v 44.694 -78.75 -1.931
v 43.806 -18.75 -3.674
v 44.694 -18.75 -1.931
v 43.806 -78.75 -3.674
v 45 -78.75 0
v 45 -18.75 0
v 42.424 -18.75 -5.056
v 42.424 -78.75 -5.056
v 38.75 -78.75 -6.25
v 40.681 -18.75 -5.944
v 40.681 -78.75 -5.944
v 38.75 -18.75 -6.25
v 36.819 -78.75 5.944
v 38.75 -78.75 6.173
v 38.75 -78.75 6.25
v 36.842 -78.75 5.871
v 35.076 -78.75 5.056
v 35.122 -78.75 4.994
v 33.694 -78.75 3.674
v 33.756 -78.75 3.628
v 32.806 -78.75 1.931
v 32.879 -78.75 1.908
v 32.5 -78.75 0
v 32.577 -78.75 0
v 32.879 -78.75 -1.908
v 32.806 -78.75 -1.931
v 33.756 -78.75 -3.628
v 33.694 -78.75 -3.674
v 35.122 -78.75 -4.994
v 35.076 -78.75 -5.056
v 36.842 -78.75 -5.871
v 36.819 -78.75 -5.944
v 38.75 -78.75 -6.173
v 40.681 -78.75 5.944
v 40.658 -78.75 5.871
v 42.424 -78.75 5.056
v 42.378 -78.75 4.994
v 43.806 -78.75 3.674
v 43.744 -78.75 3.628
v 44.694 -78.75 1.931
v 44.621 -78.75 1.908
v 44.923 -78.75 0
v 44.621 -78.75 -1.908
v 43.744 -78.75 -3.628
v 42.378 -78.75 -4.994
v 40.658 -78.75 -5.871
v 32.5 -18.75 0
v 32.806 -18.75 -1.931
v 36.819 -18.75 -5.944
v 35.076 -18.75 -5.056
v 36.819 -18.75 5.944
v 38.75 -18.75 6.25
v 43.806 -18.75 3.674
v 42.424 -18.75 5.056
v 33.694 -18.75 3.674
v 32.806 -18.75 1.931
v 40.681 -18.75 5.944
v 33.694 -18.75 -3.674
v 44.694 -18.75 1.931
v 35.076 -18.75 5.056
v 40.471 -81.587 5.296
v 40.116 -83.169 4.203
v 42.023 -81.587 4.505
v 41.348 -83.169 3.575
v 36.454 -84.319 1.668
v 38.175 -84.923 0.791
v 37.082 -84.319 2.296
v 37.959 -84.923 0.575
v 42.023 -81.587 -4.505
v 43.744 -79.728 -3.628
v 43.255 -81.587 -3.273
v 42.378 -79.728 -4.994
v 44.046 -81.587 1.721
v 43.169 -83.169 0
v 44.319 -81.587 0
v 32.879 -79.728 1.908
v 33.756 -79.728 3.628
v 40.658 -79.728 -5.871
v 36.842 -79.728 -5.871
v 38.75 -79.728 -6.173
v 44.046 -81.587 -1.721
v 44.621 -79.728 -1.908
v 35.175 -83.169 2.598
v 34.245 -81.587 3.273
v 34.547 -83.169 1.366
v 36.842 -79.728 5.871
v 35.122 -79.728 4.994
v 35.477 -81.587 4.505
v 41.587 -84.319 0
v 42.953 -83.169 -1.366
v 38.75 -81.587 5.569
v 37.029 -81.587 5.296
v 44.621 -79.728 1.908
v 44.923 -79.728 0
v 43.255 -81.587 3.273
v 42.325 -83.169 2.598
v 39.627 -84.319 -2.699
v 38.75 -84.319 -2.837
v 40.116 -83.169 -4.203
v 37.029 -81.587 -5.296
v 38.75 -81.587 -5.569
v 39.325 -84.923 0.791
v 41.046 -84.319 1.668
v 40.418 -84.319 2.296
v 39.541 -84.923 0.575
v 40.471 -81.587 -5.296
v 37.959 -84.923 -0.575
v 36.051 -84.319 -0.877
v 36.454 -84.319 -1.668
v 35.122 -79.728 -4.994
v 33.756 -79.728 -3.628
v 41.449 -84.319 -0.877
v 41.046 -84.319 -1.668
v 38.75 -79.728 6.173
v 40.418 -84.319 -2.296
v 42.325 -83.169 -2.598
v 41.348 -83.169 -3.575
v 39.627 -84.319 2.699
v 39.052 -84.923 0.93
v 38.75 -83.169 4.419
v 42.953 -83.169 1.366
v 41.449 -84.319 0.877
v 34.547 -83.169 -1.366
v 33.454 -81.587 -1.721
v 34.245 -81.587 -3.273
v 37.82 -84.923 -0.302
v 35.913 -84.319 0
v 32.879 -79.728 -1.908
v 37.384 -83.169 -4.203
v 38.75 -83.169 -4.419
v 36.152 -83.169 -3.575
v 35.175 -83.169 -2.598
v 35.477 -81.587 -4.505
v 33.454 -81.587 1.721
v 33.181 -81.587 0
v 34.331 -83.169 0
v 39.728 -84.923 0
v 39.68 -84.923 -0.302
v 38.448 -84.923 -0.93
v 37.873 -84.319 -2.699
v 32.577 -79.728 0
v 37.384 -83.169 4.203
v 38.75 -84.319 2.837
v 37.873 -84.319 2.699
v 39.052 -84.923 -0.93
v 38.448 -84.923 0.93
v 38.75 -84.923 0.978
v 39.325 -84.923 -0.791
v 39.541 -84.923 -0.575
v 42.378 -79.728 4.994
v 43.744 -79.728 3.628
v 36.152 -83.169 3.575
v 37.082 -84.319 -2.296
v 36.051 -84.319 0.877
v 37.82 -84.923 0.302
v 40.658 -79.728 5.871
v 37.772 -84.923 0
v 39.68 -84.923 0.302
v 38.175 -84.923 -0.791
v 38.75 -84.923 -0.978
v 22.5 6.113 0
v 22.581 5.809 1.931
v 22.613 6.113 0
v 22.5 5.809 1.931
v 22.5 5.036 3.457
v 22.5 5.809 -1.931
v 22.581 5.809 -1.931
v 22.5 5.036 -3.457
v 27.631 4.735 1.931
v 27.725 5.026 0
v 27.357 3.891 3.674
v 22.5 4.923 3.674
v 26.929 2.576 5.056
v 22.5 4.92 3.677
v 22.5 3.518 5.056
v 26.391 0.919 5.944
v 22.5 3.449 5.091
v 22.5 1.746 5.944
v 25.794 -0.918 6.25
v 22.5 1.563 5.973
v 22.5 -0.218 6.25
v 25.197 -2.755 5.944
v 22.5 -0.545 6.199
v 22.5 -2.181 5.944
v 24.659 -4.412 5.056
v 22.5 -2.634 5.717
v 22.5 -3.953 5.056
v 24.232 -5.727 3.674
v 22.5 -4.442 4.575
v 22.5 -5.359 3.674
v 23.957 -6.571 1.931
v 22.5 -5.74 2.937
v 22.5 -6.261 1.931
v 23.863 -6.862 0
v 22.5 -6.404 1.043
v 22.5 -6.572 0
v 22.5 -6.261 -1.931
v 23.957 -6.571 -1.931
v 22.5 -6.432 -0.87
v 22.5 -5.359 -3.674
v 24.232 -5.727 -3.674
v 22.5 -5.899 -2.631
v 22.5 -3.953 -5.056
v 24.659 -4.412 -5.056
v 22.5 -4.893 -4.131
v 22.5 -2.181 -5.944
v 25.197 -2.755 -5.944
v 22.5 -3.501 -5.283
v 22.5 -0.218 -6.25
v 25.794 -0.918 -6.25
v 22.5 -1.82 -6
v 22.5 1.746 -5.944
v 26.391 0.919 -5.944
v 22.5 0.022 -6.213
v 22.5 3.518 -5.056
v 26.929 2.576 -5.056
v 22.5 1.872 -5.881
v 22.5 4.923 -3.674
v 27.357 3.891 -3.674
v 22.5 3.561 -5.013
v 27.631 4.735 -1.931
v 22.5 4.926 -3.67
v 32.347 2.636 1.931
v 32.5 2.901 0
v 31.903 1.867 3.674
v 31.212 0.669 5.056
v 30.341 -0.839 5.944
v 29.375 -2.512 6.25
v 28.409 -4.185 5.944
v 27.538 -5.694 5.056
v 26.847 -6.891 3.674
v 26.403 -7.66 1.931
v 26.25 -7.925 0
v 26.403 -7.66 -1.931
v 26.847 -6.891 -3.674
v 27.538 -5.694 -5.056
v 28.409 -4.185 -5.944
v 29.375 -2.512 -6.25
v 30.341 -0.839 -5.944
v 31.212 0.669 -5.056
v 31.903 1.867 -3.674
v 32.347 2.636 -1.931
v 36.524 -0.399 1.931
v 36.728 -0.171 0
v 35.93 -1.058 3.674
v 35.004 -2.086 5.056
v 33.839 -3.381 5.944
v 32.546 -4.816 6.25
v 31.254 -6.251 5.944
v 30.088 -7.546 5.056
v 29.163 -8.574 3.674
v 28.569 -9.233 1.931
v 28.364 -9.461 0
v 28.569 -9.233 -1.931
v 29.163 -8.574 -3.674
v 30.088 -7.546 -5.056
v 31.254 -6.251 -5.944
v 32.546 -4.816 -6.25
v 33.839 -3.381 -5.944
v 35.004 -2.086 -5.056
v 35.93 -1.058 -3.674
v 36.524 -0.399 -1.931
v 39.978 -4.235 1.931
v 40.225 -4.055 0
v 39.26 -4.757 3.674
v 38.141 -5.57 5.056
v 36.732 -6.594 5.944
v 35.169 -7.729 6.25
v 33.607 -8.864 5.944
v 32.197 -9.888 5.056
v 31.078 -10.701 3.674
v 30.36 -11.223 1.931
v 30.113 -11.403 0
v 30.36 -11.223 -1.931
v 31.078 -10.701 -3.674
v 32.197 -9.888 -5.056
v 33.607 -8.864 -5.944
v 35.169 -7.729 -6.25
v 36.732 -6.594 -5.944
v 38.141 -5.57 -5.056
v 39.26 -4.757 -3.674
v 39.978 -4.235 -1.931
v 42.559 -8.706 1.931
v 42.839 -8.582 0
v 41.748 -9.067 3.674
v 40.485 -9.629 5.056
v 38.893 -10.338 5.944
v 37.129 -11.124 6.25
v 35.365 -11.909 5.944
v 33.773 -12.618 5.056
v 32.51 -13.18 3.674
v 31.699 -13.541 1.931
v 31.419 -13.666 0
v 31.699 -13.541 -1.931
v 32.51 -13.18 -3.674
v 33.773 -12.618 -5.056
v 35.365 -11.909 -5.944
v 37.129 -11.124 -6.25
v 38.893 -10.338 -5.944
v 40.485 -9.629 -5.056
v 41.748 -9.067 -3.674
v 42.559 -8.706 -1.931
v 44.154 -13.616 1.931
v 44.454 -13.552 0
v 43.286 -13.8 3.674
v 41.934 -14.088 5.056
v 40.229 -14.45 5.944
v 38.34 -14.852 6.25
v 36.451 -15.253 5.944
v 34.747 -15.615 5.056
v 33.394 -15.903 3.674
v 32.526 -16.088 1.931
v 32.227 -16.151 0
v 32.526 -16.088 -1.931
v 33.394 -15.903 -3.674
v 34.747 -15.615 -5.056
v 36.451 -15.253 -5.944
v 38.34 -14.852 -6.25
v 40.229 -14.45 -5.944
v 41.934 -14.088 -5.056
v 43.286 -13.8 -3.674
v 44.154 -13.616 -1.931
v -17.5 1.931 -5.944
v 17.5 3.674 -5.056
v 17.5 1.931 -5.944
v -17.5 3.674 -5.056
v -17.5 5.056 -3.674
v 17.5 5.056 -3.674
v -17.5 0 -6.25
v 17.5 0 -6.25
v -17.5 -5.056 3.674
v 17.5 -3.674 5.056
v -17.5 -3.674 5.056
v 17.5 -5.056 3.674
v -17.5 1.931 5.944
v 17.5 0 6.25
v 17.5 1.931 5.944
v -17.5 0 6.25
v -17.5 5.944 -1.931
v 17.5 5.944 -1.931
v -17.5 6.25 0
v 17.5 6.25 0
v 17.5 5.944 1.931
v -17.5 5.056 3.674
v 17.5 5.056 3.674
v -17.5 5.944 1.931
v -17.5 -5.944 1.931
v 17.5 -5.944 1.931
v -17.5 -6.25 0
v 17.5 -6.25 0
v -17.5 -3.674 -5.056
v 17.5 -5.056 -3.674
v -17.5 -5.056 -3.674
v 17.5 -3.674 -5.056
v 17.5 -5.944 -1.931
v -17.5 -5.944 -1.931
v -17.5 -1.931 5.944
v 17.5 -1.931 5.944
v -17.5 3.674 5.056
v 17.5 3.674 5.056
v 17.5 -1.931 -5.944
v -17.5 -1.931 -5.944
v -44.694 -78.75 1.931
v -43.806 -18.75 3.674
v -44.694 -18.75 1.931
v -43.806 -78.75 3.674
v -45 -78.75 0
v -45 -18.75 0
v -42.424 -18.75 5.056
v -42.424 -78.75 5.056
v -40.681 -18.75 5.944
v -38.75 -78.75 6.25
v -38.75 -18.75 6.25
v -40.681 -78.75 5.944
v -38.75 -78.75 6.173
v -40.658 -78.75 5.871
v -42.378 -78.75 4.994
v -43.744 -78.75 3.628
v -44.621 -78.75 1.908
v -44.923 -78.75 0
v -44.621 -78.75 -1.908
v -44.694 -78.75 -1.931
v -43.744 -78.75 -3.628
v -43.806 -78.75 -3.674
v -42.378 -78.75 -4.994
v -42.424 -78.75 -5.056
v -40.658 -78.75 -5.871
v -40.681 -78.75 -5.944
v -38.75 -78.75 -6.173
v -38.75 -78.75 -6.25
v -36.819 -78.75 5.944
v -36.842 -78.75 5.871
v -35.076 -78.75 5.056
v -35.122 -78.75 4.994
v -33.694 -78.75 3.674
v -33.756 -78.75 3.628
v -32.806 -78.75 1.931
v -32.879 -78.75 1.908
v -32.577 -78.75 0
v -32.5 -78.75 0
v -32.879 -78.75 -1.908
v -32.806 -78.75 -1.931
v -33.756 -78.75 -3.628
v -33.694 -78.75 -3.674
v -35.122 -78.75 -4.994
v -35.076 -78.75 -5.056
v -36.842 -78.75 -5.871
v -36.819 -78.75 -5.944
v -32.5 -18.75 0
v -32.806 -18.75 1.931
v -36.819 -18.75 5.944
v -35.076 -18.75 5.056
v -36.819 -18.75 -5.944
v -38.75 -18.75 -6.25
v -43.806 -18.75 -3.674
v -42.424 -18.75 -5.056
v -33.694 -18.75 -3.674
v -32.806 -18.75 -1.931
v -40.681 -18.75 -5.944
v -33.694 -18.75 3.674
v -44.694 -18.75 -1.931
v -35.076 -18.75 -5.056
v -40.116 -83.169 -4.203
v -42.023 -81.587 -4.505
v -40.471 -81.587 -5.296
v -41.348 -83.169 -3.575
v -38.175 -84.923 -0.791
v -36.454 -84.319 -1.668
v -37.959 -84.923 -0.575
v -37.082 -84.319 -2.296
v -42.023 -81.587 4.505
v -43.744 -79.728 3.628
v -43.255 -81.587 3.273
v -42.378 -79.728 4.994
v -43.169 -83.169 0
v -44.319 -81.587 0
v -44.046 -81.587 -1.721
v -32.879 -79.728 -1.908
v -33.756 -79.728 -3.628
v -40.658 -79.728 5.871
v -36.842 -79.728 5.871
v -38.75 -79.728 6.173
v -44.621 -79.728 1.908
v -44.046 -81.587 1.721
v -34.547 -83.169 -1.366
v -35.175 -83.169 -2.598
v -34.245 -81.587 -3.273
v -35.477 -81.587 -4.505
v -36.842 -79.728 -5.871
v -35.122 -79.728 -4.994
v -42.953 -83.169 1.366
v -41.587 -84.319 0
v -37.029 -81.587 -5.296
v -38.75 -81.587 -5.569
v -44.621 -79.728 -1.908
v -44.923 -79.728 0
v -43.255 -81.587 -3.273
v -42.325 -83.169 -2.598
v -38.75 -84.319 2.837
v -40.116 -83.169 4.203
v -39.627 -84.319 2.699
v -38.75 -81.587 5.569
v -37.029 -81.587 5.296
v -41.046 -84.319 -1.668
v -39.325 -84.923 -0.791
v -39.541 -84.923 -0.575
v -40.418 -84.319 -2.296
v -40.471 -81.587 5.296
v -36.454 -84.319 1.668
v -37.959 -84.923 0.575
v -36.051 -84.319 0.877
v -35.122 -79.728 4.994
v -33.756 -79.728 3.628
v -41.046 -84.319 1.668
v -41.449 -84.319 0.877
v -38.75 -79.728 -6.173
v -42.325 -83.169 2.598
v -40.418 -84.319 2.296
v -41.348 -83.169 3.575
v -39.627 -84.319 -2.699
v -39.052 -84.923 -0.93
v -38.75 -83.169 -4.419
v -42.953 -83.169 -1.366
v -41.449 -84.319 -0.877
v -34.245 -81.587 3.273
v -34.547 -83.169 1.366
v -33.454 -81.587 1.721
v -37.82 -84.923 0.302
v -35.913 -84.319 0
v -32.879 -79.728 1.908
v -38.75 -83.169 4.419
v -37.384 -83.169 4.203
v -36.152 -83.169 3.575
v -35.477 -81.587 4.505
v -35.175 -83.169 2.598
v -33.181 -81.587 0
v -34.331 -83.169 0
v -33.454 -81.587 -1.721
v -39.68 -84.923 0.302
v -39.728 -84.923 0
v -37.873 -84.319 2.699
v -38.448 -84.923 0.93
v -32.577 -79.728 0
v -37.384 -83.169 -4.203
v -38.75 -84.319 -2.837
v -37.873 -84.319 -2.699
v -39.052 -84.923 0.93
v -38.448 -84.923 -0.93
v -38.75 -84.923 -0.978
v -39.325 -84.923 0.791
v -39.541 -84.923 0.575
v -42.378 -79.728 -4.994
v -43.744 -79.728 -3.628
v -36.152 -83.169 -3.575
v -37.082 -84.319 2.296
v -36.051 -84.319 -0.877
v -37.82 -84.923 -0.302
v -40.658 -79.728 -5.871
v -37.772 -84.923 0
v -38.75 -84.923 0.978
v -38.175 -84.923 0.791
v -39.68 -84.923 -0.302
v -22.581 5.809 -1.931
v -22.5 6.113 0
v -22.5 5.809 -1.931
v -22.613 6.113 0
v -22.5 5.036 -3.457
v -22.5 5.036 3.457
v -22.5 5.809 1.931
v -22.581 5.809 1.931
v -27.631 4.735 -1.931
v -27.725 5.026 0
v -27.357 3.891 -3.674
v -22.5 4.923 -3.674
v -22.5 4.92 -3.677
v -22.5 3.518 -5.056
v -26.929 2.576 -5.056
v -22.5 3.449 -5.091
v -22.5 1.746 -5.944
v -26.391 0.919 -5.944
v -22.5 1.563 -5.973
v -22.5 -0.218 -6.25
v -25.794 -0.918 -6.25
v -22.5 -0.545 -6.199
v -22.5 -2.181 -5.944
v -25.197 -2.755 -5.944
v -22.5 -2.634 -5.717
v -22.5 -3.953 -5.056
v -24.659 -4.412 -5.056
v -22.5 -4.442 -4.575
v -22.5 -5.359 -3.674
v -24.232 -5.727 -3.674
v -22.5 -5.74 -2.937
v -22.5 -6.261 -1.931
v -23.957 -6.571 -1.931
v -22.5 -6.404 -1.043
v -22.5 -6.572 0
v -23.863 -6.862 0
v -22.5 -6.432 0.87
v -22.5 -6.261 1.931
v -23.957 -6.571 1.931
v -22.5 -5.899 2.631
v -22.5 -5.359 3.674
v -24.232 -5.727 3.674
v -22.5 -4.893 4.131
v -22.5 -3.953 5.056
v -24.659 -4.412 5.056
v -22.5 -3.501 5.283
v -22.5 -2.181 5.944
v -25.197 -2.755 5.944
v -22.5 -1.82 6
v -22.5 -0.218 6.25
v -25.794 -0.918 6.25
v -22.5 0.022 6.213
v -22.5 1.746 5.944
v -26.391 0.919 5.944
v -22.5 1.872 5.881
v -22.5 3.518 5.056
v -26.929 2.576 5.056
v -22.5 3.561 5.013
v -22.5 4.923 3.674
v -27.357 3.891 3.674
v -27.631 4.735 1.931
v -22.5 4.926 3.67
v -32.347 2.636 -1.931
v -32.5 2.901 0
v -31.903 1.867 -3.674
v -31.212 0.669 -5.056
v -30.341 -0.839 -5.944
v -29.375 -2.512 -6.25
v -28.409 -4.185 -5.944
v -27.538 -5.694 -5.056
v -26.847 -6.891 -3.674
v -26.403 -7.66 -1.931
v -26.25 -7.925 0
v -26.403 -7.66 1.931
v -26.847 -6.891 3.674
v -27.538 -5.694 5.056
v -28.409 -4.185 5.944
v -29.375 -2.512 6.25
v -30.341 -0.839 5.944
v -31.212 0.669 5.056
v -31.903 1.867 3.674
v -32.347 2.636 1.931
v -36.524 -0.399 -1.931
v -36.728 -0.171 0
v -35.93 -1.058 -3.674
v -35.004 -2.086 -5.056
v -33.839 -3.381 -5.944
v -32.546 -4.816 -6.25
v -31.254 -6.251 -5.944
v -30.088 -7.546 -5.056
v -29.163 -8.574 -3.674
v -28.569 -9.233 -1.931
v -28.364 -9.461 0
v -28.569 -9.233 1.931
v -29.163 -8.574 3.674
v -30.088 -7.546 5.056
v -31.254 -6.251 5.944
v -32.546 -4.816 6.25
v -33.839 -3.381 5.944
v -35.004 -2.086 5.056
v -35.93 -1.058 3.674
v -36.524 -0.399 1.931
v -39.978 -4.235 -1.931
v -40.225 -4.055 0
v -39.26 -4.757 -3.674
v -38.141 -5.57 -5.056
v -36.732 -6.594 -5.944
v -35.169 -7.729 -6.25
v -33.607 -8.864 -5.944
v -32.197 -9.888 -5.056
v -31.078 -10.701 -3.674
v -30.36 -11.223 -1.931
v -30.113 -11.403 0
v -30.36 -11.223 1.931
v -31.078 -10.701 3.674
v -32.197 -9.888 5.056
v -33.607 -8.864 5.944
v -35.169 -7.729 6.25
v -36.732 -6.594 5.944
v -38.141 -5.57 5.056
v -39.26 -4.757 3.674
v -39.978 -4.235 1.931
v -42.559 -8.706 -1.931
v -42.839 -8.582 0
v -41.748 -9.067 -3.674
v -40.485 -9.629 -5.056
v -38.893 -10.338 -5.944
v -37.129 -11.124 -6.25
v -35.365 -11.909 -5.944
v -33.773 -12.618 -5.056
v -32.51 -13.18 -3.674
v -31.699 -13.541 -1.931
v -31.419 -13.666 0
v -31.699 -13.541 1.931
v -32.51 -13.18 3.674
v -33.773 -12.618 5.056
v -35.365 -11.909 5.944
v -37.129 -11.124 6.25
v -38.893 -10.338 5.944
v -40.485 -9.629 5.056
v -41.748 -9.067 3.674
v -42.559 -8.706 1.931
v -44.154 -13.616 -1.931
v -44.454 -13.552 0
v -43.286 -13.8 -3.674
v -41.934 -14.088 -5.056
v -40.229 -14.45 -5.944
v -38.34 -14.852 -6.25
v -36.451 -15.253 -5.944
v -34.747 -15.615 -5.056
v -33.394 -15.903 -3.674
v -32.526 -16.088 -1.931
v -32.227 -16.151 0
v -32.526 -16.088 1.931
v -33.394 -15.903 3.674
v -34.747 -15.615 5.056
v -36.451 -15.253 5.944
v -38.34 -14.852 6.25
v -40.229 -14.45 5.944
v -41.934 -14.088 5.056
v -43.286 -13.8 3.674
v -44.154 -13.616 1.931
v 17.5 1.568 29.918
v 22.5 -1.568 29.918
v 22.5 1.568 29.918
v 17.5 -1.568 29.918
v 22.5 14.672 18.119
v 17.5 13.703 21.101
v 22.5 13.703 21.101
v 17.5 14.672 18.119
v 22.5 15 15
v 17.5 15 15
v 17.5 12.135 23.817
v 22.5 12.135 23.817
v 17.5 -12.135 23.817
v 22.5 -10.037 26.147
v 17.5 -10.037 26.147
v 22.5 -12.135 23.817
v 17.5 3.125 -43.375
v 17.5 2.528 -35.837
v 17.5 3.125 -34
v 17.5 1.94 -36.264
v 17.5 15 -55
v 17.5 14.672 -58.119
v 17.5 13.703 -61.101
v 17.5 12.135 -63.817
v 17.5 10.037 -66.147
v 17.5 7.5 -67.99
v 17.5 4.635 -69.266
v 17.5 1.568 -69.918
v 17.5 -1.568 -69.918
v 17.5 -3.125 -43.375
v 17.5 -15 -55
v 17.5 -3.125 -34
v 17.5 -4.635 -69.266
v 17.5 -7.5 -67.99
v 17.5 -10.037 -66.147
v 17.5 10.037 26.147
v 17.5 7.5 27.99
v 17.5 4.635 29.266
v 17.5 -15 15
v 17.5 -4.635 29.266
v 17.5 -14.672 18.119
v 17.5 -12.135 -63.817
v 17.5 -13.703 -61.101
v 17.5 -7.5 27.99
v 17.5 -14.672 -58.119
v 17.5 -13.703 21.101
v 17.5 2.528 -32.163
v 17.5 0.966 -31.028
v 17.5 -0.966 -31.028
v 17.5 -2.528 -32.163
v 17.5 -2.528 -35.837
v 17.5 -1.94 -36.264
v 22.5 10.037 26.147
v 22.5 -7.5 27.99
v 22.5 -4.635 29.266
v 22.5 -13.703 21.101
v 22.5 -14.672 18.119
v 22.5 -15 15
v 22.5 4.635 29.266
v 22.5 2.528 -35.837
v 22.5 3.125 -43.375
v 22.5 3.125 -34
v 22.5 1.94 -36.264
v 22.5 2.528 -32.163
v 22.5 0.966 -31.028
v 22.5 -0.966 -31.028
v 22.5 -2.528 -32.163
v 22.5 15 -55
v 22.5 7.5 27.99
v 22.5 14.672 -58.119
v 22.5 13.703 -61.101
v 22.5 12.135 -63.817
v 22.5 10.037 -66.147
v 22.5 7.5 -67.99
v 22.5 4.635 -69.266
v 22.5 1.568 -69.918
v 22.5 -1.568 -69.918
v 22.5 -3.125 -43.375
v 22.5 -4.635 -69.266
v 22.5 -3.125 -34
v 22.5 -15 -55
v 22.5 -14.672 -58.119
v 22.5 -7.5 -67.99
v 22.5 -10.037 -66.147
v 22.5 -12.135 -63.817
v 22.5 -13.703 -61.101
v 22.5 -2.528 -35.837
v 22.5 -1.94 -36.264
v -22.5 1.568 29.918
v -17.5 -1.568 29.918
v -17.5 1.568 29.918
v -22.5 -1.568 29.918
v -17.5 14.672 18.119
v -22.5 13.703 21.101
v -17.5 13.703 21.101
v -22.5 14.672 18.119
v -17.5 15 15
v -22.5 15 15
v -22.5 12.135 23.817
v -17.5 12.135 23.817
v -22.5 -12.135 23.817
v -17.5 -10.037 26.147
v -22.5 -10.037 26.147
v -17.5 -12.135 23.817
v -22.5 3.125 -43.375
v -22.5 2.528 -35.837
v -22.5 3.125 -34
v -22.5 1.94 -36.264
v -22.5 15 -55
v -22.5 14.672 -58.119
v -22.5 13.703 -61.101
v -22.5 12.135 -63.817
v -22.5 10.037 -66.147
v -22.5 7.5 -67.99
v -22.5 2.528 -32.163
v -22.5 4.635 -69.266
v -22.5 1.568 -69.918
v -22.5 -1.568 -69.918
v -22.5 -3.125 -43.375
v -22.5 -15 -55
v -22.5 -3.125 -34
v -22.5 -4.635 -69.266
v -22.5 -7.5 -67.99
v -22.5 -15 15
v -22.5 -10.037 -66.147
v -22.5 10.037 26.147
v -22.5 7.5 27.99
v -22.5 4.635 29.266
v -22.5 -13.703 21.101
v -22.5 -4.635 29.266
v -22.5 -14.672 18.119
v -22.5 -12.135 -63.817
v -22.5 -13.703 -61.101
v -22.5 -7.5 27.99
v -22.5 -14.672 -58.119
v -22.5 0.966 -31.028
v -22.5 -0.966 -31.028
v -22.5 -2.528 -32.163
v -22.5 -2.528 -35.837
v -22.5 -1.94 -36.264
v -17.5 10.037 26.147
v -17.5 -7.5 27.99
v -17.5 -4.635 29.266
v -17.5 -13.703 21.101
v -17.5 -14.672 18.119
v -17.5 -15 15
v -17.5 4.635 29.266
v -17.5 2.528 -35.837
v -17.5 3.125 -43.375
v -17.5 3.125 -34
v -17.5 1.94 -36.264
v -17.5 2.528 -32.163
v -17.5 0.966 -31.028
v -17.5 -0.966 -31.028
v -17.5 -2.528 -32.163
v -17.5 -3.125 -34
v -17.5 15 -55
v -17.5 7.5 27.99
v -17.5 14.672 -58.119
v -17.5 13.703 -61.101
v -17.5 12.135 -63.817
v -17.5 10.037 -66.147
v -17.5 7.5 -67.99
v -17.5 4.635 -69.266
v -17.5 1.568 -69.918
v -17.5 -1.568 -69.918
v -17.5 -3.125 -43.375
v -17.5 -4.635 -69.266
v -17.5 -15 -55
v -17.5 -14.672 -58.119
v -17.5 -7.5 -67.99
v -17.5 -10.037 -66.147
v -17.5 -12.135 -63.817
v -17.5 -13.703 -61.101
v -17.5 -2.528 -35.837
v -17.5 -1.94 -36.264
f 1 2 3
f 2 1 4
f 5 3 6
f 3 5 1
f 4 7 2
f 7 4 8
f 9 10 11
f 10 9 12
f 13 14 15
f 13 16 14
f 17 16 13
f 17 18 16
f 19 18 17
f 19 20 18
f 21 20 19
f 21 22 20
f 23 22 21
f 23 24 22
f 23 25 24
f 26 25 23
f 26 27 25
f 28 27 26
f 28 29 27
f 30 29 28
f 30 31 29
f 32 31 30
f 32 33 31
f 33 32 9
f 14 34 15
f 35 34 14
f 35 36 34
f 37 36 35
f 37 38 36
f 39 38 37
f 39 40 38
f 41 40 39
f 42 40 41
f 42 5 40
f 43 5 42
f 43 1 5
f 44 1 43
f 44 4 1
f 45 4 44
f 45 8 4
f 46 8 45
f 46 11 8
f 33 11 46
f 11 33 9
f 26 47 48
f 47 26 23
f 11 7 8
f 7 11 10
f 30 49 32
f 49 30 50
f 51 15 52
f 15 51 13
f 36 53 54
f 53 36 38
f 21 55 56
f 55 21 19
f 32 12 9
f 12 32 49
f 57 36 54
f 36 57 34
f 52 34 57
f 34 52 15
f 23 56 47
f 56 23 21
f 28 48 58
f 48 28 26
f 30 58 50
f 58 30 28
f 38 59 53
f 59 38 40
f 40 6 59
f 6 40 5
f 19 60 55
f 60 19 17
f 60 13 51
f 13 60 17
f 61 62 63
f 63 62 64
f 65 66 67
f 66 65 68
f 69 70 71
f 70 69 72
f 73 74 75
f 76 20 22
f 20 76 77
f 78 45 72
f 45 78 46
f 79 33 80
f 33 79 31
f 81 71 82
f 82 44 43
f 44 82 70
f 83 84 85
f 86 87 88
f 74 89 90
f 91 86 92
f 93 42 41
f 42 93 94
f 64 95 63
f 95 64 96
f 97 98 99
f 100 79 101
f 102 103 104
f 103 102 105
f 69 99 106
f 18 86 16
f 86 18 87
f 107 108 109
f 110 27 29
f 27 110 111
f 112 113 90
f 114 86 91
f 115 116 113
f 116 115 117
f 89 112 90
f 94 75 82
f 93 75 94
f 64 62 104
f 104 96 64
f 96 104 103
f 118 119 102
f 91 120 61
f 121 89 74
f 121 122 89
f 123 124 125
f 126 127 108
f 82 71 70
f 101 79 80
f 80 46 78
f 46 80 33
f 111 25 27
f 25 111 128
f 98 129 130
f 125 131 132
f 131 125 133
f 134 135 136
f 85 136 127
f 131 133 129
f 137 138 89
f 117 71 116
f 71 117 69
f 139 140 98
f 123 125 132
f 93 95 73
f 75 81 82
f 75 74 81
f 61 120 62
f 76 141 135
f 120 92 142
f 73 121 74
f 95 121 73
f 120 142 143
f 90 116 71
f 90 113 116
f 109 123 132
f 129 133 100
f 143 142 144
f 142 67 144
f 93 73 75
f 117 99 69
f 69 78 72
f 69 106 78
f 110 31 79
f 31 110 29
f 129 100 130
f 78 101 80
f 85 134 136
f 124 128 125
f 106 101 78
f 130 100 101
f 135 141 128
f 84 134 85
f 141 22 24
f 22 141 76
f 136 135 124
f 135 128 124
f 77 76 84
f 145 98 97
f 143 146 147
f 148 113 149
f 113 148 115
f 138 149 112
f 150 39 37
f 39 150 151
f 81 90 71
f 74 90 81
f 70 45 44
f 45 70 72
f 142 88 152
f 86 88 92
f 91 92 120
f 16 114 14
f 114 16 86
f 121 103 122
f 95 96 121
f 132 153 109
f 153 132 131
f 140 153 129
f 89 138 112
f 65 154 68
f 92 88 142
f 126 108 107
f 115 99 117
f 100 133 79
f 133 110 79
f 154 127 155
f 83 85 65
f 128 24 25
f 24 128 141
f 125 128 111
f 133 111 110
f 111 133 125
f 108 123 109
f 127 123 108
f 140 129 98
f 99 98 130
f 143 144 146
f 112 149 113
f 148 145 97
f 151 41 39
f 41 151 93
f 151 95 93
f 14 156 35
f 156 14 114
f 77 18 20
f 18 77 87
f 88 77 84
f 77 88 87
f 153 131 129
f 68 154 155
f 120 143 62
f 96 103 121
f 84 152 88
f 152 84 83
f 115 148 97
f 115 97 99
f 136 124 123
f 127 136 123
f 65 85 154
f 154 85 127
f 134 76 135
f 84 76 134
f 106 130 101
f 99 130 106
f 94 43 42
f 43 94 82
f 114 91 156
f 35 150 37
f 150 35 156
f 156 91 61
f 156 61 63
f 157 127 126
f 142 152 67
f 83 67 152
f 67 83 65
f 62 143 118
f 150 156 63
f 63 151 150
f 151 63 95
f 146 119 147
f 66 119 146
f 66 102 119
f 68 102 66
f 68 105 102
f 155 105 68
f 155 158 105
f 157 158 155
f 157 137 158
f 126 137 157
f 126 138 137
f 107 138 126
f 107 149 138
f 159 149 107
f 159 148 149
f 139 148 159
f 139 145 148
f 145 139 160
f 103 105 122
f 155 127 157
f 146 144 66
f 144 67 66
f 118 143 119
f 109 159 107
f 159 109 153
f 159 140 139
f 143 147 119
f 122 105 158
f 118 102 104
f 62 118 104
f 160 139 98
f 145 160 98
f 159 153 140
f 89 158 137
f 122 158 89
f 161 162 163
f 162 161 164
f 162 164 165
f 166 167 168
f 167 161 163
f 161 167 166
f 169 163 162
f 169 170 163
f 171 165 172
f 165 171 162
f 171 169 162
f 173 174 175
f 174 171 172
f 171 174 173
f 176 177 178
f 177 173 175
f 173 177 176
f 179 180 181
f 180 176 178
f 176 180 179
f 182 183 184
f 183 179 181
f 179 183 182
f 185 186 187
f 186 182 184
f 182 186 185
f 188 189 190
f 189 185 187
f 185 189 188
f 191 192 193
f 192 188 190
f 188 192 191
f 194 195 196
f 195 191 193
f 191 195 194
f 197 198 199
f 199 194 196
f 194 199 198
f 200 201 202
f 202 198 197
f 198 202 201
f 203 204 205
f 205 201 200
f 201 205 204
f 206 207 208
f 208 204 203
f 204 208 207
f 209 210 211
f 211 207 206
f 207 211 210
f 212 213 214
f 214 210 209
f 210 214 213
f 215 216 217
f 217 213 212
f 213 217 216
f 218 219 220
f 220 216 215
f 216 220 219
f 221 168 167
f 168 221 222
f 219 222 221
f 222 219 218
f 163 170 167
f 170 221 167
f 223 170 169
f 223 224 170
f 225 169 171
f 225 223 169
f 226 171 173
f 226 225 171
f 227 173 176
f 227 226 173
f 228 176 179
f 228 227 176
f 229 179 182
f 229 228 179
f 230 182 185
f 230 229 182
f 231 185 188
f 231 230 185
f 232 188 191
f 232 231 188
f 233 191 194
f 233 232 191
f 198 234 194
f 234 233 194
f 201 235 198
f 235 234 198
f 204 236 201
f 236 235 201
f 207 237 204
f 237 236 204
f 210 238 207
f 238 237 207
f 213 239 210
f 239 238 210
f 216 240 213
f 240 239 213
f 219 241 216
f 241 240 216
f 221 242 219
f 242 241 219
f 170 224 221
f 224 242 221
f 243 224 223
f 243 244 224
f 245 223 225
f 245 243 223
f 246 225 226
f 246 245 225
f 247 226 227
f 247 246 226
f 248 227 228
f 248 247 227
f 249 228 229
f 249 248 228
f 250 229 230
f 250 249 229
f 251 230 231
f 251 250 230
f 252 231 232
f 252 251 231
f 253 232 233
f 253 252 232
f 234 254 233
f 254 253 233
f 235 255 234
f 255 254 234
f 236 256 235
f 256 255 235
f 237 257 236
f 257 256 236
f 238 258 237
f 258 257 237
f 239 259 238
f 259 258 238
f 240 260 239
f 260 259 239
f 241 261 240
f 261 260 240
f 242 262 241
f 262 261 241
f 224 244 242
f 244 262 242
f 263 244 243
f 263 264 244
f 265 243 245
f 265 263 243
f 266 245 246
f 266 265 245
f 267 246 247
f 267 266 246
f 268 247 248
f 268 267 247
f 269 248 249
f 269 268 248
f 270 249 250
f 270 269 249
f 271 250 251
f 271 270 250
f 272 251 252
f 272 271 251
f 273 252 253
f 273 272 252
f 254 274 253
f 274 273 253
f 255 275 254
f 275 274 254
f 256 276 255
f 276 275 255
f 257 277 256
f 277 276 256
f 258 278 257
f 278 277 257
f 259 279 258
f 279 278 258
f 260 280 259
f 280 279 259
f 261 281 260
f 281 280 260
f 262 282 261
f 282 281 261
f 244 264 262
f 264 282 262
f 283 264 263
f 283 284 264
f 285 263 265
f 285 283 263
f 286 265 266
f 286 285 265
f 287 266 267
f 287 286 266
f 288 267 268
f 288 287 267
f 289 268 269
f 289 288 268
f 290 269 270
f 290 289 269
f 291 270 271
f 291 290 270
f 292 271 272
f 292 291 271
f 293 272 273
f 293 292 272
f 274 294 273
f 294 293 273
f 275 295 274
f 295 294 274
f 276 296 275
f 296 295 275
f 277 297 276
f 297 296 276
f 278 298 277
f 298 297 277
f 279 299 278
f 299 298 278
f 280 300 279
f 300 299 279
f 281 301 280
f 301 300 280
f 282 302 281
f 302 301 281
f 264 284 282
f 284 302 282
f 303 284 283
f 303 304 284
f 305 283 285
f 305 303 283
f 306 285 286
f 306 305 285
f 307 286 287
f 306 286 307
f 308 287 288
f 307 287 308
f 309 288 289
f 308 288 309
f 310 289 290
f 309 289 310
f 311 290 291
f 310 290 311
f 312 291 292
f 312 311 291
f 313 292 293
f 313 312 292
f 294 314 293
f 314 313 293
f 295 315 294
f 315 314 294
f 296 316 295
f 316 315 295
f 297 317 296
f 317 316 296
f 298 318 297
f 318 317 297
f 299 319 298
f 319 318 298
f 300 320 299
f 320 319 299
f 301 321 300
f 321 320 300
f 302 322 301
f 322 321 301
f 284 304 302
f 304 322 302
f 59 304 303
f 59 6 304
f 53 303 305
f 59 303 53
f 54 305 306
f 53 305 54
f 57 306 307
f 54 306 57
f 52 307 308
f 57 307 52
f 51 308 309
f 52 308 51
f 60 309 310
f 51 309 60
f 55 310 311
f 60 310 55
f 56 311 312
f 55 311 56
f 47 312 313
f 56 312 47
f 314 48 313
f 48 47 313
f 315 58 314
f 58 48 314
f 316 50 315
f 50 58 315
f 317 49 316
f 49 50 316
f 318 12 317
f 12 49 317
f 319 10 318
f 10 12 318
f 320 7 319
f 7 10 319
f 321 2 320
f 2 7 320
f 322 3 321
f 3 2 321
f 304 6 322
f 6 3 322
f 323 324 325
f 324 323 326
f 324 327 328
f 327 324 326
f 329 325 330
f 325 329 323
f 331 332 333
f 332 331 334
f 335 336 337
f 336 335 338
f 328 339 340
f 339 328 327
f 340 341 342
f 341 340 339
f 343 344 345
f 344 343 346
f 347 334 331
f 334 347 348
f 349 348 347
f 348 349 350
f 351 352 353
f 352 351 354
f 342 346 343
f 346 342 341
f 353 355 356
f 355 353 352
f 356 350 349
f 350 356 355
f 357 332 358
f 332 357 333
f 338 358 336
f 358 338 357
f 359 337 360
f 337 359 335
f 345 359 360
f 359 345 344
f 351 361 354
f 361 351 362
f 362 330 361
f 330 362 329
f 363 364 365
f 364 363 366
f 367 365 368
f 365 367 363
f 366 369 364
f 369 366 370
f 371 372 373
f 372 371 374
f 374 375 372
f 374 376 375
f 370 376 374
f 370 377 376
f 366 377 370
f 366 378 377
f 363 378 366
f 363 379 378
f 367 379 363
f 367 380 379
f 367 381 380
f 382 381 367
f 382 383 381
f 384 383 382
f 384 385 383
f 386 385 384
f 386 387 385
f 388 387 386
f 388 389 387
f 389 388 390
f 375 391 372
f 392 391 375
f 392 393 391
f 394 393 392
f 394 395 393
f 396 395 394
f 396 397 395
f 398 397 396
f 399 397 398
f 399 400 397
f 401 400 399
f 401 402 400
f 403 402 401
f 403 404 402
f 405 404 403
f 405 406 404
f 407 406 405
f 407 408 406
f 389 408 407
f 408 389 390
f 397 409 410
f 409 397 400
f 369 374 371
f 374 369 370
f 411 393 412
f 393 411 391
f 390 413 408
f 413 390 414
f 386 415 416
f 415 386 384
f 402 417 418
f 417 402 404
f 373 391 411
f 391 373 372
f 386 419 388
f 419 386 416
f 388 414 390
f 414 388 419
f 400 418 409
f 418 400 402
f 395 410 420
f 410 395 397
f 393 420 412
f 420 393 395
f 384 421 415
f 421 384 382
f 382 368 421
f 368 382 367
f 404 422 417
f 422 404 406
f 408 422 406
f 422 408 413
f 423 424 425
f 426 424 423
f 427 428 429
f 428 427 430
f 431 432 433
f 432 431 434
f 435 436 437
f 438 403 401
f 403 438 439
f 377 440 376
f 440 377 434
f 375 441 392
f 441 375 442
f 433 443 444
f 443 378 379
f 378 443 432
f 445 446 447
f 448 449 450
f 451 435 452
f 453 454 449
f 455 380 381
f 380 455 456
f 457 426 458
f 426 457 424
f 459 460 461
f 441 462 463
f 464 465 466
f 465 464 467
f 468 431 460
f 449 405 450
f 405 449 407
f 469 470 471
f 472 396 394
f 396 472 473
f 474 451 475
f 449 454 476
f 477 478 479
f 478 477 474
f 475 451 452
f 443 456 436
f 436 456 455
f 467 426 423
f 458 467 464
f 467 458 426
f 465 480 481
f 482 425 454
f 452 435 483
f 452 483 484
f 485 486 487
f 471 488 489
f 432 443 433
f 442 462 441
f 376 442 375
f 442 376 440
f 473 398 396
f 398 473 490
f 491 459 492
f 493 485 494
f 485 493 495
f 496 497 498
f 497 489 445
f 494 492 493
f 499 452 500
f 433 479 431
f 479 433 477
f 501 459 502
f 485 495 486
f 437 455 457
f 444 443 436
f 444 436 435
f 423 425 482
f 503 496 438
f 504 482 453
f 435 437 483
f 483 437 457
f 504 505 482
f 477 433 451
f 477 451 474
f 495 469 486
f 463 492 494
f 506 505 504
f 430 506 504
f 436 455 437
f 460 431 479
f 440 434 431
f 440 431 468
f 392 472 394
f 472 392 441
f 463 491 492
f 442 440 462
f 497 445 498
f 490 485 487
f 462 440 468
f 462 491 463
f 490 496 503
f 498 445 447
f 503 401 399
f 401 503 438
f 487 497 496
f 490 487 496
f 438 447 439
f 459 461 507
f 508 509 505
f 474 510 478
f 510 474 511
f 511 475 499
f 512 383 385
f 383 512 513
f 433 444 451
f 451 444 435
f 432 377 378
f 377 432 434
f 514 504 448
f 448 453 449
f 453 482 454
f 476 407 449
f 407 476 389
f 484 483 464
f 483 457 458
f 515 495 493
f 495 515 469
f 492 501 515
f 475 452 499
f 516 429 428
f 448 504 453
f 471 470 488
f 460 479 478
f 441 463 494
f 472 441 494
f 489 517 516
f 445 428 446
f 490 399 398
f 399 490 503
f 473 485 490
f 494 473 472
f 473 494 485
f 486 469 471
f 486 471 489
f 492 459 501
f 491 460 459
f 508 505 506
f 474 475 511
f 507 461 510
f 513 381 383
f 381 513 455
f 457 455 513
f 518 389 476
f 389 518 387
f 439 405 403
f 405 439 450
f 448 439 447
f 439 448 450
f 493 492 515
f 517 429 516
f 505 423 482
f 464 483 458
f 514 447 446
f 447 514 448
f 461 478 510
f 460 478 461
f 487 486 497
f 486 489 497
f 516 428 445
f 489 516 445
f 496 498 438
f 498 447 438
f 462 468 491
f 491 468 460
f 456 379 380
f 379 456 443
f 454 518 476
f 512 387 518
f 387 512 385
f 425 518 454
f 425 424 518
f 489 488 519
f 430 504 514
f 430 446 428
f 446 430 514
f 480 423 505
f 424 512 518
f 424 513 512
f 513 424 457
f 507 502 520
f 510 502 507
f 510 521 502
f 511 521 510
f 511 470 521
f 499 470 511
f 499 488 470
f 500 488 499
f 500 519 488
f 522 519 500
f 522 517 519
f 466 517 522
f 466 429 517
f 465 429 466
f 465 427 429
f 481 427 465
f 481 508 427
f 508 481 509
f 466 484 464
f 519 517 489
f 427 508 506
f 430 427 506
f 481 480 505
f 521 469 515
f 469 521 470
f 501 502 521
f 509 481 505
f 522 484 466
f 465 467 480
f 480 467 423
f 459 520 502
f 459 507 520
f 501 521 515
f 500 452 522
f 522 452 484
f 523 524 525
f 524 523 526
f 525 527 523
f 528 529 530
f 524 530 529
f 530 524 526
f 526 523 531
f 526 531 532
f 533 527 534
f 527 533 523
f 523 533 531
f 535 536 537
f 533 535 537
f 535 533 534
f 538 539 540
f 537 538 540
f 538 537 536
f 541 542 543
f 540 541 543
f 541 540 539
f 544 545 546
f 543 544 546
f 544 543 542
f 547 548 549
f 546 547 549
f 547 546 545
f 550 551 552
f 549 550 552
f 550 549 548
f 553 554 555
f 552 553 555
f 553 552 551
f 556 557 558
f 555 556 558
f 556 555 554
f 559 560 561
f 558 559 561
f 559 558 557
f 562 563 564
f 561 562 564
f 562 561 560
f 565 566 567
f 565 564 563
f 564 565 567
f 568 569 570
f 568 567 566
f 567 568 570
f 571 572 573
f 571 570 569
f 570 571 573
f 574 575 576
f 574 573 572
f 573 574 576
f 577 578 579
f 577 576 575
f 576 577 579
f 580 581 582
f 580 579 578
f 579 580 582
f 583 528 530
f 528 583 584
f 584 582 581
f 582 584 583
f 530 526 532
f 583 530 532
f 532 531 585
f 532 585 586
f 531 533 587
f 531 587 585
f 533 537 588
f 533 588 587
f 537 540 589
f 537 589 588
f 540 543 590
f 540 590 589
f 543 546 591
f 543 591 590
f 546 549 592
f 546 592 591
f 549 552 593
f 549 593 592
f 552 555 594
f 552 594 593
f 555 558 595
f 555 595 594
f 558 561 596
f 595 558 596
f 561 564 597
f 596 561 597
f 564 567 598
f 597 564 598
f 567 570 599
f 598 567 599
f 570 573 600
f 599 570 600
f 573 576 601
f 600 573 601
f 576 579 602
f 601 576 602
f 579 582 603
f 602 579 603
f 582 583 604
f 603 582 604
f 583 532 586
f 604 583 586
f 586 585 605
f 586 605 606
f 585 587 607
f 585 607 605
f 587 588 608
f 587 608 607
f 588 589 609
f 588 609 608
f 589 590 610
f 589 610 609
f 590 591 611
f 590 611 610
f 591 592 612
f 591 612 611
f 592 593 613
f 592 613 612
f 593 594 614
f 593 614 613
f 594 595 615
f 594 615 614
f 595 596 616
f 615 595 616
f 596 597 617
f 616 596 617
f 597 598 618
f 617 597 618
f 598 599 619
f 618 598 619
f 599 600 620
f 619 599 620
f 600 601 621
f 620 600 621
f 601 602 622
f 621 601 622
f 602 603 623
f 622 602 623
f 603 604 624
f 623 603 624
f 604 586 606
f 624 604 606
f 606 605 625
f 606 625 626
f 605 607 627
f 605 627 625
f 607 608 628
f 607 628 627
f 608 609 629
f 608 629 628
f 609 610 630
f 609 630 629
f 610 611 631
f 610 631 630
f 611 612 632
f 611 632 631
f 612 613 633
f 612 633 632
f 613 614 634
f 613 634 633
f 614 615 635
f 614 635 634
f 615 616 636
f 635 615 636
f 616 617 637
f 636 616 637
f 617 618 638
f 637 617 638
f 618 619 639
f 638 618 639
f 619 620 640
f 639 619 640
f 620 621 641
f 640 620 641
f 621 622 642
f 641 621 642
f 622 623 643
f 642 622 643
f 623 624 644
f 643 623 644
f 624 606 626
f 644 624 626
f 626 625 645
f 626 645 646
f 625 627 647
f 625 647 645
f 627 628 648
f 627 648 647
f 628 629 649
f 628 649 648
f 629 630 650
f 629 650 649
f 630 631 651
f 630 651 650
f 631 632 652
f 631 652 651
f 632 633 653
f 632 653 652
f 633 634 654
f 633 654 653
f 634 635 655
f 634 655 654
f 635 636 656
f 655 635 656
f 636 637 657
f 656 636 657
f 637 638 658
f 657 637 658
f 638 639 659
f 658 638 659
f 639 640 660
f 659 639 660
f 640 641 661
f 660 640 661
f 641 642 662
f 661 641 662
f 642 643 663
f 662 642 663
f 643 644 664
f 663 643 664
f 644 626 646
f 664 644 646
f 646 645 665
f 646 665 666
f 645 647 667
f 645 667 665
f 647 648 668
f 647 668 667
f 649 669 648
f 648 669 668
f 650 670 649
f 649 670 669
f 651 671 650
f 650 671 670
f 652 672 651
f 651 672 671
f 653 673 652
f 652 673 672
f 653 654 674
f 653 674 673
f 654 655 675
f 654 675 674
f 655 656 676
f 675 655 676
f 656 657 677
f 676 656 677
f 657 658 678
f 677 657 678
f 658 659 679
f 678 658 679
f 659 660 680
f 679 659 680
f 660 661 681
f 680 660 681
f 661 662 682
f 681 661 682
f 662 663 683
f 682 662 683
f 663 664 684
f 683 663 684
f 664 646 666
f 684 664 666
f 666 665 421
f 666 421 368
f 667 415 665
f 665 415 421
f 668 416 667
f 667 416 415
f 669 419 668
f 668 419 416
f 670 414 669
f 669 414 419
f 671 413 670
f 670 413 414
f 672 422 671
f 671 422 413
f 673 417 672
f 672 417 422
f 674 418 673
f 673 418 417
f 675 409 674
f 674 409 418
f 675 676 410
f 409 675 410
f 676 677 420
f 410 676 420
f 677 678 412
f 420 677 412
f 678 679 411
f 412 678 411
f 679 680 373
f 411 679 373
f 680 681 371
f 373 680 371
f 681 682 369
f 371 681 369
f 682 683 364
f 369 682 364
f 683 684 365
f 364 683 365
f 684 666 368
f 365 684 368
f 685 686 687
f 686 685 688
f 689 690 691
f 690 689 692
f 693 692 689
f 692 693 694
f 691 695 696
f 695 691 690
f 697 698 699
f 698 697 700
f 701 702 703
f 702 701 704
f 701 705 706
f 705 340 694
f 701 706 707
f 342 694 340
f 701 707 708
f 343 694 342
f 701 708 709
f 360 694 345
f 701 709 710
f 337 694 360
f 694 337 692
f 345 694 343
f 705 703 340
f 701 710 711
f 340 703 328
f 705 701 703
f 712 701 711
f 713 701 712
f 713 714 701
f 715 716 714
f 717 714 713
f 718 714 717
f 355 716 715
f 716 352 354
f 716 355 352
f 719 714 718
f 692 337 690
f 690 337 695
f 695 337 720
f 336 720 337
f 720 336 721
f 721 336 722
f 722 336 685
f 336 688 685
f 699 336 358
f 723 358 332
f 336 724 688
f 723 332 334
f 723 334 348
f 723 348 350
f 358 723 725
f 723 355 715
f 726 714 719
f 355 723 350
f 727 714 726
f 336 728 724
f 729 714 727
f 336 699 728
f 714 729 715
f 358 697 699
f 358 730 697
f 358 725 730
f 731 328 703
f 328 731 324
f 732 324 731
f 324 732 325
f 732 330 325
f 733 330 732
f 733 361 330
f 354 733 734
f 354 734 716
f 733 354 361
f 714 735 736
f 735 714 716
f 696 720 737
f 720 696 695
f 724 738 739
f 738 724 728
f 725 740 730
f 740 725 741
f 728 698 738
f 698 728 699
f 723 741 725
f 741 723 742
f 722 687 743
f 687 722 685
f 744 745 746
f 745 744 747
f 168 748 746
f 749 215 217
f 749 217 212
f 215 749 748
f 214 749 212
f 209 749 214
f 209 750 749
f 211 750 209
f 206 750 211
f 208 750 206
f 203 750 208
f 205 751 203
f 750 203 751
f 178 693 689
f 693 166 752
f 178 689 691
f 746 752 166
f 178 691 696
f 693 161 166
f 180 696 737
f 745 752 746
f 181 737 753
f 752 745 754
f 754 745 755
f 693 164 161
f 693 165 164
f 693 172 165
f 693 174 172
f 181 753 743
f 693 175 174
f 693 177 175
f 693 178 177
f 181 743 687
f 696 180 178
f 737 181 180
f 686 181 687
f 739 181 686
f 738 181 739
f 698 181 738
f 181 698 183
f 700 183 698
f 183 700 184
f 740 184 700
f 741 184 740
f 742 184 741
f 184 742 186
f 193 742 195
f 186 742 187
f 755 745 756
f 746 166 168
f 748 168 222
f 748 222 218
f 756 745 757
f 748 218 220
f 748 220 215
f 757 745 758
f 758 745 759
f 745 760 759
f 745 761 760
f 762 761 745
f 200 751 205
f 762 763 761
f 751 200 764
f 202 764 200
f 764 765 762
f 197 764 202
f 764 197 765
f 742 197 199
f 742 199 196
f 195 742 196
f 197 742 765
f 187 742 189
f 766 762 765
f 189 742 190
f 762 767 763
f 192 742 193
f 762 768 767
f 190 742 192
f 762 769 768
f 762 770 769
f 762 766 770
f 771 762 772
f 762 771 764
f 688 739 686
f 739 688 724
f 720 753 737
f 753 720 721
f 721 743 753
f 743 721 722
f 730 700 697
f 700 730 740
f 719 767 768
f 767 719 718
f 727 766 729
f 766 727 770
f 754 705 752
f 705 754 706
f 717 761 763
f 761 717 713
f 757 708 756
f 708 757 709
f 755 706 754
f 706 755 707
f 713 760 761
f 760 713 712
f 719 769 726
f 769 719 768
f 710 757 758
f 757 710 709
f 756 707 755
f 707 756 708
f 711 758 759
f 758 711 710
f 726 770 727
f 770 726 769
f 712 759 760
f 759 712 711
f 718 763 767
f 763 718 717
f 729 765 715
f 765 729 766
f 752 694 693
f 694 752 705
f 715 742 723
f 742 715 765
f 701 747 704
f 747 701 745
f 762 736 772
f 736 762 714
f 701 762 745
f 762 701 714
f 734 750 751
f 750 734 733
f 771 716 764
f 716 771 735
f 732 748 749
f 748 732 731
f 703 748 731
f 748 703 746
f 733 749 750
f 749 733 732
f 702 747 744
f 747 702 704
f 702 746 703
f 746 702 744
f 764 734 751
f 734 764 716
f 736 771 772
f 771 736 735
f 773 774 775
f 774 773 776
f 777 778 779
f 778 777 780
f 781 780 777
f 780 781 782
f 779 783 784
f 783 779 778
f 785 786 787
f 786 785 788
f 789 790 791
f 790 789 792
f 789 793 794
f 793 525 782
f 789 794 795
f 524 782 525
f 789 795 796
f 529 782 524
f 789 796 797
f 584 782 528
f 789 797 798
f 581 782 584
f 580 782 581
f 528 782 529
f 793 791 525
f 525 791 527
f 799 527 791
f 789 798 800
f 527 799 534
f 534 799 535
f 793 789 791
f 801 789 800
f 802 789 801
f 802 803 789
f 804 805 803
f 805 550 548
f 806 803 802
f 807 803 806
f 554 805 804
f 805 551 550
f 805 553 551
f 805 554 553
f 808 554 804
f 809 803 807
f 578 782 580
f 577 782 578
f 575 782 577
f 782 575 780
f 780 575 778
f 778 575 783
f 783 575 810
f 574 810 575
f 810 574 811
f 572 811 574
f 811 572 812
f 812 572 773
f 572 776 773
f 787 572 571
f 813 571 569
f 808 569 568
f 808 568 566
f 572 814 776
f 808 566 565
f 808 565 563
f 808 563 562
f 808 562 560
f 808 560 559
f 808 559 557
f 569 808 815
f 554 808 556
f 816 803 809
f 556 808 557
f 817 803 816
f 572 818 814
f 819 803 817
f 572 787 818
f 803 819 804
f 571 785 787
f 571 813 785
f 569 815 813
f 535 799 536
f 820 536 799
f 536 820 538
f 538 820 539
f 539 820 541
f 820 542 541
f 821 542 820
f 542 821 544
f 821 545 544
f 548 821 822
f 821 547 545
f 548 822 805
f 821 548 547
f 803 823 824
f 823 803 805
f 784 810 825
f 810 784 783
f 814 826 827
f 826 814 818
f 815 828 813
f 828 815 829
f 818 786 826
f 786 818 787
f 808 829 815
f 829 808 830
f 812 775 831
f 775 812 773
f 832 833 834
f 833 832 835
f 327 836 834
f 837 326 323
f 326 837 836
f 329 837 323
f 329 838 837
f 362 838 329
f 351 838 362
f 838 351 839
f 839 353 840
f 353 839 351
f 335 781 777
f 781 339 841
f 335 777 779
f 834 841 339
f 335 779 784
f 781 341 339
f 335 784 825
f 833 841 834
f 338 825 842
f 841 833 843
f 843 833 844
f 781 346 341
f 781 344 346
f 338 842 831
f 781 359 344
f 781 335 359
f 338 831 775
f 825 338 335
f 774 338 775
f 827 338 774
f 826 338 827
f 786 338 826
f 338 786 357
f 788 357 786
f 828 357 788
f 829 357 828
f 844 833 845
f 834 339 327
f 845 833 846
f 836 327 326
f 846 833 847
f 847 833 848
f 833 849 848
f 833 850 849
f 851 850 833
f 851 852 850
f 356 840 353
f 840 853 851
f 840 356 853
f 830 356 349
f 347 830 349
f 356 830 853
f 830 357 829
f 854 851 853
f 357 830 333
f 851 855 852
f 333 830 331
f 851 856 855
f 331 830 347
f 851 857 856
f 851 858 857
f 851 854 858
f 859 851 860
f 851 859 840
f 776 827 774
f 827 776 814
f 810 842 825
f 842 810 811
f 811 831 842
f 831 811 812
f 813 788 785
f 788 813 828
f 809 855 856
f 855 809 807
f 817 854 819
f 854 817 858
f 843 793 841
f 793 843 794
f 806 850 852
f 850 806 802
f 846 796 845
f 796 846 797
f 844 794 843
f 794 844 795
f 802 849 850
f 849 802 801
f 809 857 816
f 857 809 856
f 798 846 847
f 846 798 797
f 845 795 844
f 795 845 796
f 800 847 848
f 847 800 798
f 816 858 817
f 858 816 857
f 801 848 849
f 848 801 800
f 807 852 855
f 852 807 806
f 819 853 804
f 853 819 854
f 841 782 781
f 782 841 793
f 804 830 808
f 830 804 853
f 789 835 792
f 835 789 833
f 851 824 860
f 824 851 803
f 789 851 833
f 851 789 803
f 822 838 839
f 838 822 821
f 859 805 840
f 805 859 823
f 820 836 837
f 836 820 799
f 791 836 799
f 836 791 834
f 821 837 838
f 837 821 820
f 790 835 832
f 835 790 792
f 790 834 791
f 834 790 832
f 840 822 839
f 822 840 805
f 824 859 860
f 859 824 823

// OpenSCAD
size=100;
door_thickness=40;


module doorhandle(s=size, dt=door_thickness){
    
    pl=s;//plate_length
    pw=0.3*s;//plate_width
    pt=s/20;//plate_thickness 
    kr=s/32; //keyhole_radius
    hr=s/16; //handle_radius
    hl=0.6*s; //handle_length
    
    module keyhole_punch() {
        translate([0,0,-pt/2])
        union() {
            linear_extrude(2*pt)
                polygon([[-kr,-kr*3],[kr,-kr*3],[0.5*kr,0],[-0.5*kr,0]]);
            cylinder(2*pt,kr,kr);
        }
    }
    module plate() {
        translate([-pw/2,-0.7*pl,-pt/2])
        difference() {
            union(){
                translate([pw/2,pl-pw/2,0])
                    cylinder(pt,pw/2,pw/2);
                translate([pw/2,pw/2,0])
                    cylinder(pt,pw/2,pw/2);
                translate([0,pw/2,0])
                    cube([pw,pl-pw,pt]);
            }
        translate([pw/2,pw*1.2,0])
            keyhole_punch();
        }
    }
    
   module handle() {
       union() {
           rotate([0,90,0])
           cylinder(dt/2,hr,hr);
               translate([dt/2,-3*hr,0])
           union() {
               translate([3*hr,-hl,0])
                   rotate([270,0,0])
                   union() {
                       cylinder(hl,hr,hr);
                       sphere(hr);
                   }
               intersection() {
                   translate([0,0,-3*hr])
                       cube([6*hr,6*hr,6*hr]);
                   rotate_extrude()
                       translate([3*hr, 0]) circle(hr);
               }
           }
       }
   }
   union() {
       handle();
           rotate([0,180,0])
                handle();
           rotate([90,0,90])
           union(){ 
                translate([0,0,dt/2])    
                plate();
                translate([0,0,-dt/2])     
                plate();
           }
   }

   
}


doorhandle();
